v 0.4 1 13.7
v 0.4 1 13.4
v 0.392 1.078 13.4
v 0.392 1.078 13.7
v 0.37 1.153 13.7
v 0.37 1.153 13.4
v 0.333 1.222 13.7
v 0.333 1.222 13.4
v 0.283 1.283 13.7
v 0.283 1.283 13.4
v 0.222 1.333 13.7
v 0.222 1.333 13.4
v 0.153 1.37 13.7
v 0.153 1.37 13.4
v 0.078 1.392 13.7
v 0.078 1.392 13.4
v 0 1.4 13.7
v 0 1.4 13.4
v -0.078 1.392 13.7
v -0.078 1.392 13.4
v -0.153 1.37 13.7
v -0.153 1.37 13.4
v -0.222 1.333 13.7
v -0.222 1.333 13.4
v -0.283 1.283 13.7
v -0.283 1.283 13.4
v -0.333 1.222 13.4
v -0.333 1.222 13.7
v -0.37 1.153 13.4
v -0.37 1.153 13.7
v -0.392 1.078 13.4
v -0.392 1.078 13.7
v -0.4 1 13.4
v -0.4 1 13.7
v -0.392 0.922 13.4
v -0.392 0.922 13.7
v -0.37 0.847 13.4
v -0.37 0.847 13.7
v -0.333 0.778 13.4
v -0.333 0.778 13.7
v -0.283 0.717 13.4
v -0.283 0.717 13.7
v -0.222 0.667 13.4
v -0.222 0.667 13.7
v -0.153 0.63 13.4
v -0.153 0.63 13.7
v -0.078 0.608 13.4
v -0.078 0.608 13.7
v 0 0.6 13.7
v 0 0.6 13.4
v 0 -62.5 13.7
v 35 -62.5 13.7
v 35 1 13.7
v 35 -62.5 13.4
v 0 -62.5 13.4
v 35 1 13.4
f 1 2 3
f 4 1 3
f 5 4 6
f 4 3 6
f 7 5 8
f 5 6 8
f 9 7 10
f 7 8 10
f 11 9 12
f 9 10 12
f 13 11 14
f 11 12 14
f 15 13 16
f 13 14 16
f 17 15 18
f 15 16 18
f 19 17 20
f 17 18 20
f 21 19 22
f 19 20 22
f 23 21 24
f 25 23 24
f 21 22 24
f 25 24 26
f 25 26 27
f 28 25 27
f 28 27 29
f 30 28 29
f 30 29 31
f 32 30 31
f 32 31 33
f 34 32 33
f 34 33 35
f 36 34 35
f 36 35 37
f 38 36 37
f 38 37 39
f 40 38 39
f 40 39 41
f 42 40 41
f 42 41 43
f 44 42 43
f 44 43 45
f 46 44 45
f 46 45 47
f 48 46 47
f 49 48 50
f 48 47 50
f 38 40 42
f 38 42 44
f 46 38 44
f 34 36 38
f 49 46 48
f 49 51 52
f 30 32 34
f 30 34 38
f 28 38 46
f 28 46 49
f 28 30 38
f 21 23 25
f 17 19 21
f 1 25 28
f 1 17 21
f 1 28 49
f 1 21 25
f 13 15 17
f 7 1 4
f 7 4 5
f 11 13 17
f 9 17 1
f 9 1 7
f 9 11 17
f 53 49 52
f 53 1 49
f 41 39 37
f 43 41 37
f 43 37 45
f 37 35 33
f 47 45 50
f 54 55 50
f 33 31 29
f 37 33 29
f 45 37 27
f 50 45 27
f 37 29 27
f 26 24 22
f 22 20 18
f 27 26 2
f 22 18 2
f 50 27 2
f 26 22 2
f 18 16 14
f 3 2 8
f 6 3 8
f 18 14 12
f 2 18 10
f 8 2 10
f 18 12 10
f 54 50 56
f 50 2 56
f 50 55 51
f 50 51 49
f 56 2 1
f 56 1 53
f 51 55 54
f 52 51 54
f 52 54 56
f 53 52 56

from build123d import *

# Parameters (mm, degrees)
CYLINDER_R     = 0.4
CYLINDER_DEPTH = 0.3
BOX003_W       = 35
BOX003_H       = 63.5
BOX003_DEPTH   = 0.3


with BuildPart() as cylinder:
    # Cylinder → Cylinder (new body)
    with BuildSketch(Plane(origin=(0, 1, 11.4), x_dir=(1, 0, 0), z_dir=(0, 0, 1))):
        Circle(CYLINDER_R)
    extrude(amount=CYLINDER_DEPTH)


with BuildPart() as displayframe:
    # Box003 → Box003 (new body)
    with BuildSketch(Plane(origin=(0, -62.5, 11.4), x_dir=(1, 0, 0), z_dir=(0, 0, 1))):
        with Locations((17.5, 31.75)):
            Rectangle(BOX003_W, BOX003_H)
    extrude(amount=BOX003_DEPTH)

    # Fusion: union Cylinder
    add(cylinder.part)


with BuildPart() as displayframe_1:
    # Fusion placement: moved
    add(displayframe.part.moved(Location((0, 0, 2))))


solid = displayframe_1.part
